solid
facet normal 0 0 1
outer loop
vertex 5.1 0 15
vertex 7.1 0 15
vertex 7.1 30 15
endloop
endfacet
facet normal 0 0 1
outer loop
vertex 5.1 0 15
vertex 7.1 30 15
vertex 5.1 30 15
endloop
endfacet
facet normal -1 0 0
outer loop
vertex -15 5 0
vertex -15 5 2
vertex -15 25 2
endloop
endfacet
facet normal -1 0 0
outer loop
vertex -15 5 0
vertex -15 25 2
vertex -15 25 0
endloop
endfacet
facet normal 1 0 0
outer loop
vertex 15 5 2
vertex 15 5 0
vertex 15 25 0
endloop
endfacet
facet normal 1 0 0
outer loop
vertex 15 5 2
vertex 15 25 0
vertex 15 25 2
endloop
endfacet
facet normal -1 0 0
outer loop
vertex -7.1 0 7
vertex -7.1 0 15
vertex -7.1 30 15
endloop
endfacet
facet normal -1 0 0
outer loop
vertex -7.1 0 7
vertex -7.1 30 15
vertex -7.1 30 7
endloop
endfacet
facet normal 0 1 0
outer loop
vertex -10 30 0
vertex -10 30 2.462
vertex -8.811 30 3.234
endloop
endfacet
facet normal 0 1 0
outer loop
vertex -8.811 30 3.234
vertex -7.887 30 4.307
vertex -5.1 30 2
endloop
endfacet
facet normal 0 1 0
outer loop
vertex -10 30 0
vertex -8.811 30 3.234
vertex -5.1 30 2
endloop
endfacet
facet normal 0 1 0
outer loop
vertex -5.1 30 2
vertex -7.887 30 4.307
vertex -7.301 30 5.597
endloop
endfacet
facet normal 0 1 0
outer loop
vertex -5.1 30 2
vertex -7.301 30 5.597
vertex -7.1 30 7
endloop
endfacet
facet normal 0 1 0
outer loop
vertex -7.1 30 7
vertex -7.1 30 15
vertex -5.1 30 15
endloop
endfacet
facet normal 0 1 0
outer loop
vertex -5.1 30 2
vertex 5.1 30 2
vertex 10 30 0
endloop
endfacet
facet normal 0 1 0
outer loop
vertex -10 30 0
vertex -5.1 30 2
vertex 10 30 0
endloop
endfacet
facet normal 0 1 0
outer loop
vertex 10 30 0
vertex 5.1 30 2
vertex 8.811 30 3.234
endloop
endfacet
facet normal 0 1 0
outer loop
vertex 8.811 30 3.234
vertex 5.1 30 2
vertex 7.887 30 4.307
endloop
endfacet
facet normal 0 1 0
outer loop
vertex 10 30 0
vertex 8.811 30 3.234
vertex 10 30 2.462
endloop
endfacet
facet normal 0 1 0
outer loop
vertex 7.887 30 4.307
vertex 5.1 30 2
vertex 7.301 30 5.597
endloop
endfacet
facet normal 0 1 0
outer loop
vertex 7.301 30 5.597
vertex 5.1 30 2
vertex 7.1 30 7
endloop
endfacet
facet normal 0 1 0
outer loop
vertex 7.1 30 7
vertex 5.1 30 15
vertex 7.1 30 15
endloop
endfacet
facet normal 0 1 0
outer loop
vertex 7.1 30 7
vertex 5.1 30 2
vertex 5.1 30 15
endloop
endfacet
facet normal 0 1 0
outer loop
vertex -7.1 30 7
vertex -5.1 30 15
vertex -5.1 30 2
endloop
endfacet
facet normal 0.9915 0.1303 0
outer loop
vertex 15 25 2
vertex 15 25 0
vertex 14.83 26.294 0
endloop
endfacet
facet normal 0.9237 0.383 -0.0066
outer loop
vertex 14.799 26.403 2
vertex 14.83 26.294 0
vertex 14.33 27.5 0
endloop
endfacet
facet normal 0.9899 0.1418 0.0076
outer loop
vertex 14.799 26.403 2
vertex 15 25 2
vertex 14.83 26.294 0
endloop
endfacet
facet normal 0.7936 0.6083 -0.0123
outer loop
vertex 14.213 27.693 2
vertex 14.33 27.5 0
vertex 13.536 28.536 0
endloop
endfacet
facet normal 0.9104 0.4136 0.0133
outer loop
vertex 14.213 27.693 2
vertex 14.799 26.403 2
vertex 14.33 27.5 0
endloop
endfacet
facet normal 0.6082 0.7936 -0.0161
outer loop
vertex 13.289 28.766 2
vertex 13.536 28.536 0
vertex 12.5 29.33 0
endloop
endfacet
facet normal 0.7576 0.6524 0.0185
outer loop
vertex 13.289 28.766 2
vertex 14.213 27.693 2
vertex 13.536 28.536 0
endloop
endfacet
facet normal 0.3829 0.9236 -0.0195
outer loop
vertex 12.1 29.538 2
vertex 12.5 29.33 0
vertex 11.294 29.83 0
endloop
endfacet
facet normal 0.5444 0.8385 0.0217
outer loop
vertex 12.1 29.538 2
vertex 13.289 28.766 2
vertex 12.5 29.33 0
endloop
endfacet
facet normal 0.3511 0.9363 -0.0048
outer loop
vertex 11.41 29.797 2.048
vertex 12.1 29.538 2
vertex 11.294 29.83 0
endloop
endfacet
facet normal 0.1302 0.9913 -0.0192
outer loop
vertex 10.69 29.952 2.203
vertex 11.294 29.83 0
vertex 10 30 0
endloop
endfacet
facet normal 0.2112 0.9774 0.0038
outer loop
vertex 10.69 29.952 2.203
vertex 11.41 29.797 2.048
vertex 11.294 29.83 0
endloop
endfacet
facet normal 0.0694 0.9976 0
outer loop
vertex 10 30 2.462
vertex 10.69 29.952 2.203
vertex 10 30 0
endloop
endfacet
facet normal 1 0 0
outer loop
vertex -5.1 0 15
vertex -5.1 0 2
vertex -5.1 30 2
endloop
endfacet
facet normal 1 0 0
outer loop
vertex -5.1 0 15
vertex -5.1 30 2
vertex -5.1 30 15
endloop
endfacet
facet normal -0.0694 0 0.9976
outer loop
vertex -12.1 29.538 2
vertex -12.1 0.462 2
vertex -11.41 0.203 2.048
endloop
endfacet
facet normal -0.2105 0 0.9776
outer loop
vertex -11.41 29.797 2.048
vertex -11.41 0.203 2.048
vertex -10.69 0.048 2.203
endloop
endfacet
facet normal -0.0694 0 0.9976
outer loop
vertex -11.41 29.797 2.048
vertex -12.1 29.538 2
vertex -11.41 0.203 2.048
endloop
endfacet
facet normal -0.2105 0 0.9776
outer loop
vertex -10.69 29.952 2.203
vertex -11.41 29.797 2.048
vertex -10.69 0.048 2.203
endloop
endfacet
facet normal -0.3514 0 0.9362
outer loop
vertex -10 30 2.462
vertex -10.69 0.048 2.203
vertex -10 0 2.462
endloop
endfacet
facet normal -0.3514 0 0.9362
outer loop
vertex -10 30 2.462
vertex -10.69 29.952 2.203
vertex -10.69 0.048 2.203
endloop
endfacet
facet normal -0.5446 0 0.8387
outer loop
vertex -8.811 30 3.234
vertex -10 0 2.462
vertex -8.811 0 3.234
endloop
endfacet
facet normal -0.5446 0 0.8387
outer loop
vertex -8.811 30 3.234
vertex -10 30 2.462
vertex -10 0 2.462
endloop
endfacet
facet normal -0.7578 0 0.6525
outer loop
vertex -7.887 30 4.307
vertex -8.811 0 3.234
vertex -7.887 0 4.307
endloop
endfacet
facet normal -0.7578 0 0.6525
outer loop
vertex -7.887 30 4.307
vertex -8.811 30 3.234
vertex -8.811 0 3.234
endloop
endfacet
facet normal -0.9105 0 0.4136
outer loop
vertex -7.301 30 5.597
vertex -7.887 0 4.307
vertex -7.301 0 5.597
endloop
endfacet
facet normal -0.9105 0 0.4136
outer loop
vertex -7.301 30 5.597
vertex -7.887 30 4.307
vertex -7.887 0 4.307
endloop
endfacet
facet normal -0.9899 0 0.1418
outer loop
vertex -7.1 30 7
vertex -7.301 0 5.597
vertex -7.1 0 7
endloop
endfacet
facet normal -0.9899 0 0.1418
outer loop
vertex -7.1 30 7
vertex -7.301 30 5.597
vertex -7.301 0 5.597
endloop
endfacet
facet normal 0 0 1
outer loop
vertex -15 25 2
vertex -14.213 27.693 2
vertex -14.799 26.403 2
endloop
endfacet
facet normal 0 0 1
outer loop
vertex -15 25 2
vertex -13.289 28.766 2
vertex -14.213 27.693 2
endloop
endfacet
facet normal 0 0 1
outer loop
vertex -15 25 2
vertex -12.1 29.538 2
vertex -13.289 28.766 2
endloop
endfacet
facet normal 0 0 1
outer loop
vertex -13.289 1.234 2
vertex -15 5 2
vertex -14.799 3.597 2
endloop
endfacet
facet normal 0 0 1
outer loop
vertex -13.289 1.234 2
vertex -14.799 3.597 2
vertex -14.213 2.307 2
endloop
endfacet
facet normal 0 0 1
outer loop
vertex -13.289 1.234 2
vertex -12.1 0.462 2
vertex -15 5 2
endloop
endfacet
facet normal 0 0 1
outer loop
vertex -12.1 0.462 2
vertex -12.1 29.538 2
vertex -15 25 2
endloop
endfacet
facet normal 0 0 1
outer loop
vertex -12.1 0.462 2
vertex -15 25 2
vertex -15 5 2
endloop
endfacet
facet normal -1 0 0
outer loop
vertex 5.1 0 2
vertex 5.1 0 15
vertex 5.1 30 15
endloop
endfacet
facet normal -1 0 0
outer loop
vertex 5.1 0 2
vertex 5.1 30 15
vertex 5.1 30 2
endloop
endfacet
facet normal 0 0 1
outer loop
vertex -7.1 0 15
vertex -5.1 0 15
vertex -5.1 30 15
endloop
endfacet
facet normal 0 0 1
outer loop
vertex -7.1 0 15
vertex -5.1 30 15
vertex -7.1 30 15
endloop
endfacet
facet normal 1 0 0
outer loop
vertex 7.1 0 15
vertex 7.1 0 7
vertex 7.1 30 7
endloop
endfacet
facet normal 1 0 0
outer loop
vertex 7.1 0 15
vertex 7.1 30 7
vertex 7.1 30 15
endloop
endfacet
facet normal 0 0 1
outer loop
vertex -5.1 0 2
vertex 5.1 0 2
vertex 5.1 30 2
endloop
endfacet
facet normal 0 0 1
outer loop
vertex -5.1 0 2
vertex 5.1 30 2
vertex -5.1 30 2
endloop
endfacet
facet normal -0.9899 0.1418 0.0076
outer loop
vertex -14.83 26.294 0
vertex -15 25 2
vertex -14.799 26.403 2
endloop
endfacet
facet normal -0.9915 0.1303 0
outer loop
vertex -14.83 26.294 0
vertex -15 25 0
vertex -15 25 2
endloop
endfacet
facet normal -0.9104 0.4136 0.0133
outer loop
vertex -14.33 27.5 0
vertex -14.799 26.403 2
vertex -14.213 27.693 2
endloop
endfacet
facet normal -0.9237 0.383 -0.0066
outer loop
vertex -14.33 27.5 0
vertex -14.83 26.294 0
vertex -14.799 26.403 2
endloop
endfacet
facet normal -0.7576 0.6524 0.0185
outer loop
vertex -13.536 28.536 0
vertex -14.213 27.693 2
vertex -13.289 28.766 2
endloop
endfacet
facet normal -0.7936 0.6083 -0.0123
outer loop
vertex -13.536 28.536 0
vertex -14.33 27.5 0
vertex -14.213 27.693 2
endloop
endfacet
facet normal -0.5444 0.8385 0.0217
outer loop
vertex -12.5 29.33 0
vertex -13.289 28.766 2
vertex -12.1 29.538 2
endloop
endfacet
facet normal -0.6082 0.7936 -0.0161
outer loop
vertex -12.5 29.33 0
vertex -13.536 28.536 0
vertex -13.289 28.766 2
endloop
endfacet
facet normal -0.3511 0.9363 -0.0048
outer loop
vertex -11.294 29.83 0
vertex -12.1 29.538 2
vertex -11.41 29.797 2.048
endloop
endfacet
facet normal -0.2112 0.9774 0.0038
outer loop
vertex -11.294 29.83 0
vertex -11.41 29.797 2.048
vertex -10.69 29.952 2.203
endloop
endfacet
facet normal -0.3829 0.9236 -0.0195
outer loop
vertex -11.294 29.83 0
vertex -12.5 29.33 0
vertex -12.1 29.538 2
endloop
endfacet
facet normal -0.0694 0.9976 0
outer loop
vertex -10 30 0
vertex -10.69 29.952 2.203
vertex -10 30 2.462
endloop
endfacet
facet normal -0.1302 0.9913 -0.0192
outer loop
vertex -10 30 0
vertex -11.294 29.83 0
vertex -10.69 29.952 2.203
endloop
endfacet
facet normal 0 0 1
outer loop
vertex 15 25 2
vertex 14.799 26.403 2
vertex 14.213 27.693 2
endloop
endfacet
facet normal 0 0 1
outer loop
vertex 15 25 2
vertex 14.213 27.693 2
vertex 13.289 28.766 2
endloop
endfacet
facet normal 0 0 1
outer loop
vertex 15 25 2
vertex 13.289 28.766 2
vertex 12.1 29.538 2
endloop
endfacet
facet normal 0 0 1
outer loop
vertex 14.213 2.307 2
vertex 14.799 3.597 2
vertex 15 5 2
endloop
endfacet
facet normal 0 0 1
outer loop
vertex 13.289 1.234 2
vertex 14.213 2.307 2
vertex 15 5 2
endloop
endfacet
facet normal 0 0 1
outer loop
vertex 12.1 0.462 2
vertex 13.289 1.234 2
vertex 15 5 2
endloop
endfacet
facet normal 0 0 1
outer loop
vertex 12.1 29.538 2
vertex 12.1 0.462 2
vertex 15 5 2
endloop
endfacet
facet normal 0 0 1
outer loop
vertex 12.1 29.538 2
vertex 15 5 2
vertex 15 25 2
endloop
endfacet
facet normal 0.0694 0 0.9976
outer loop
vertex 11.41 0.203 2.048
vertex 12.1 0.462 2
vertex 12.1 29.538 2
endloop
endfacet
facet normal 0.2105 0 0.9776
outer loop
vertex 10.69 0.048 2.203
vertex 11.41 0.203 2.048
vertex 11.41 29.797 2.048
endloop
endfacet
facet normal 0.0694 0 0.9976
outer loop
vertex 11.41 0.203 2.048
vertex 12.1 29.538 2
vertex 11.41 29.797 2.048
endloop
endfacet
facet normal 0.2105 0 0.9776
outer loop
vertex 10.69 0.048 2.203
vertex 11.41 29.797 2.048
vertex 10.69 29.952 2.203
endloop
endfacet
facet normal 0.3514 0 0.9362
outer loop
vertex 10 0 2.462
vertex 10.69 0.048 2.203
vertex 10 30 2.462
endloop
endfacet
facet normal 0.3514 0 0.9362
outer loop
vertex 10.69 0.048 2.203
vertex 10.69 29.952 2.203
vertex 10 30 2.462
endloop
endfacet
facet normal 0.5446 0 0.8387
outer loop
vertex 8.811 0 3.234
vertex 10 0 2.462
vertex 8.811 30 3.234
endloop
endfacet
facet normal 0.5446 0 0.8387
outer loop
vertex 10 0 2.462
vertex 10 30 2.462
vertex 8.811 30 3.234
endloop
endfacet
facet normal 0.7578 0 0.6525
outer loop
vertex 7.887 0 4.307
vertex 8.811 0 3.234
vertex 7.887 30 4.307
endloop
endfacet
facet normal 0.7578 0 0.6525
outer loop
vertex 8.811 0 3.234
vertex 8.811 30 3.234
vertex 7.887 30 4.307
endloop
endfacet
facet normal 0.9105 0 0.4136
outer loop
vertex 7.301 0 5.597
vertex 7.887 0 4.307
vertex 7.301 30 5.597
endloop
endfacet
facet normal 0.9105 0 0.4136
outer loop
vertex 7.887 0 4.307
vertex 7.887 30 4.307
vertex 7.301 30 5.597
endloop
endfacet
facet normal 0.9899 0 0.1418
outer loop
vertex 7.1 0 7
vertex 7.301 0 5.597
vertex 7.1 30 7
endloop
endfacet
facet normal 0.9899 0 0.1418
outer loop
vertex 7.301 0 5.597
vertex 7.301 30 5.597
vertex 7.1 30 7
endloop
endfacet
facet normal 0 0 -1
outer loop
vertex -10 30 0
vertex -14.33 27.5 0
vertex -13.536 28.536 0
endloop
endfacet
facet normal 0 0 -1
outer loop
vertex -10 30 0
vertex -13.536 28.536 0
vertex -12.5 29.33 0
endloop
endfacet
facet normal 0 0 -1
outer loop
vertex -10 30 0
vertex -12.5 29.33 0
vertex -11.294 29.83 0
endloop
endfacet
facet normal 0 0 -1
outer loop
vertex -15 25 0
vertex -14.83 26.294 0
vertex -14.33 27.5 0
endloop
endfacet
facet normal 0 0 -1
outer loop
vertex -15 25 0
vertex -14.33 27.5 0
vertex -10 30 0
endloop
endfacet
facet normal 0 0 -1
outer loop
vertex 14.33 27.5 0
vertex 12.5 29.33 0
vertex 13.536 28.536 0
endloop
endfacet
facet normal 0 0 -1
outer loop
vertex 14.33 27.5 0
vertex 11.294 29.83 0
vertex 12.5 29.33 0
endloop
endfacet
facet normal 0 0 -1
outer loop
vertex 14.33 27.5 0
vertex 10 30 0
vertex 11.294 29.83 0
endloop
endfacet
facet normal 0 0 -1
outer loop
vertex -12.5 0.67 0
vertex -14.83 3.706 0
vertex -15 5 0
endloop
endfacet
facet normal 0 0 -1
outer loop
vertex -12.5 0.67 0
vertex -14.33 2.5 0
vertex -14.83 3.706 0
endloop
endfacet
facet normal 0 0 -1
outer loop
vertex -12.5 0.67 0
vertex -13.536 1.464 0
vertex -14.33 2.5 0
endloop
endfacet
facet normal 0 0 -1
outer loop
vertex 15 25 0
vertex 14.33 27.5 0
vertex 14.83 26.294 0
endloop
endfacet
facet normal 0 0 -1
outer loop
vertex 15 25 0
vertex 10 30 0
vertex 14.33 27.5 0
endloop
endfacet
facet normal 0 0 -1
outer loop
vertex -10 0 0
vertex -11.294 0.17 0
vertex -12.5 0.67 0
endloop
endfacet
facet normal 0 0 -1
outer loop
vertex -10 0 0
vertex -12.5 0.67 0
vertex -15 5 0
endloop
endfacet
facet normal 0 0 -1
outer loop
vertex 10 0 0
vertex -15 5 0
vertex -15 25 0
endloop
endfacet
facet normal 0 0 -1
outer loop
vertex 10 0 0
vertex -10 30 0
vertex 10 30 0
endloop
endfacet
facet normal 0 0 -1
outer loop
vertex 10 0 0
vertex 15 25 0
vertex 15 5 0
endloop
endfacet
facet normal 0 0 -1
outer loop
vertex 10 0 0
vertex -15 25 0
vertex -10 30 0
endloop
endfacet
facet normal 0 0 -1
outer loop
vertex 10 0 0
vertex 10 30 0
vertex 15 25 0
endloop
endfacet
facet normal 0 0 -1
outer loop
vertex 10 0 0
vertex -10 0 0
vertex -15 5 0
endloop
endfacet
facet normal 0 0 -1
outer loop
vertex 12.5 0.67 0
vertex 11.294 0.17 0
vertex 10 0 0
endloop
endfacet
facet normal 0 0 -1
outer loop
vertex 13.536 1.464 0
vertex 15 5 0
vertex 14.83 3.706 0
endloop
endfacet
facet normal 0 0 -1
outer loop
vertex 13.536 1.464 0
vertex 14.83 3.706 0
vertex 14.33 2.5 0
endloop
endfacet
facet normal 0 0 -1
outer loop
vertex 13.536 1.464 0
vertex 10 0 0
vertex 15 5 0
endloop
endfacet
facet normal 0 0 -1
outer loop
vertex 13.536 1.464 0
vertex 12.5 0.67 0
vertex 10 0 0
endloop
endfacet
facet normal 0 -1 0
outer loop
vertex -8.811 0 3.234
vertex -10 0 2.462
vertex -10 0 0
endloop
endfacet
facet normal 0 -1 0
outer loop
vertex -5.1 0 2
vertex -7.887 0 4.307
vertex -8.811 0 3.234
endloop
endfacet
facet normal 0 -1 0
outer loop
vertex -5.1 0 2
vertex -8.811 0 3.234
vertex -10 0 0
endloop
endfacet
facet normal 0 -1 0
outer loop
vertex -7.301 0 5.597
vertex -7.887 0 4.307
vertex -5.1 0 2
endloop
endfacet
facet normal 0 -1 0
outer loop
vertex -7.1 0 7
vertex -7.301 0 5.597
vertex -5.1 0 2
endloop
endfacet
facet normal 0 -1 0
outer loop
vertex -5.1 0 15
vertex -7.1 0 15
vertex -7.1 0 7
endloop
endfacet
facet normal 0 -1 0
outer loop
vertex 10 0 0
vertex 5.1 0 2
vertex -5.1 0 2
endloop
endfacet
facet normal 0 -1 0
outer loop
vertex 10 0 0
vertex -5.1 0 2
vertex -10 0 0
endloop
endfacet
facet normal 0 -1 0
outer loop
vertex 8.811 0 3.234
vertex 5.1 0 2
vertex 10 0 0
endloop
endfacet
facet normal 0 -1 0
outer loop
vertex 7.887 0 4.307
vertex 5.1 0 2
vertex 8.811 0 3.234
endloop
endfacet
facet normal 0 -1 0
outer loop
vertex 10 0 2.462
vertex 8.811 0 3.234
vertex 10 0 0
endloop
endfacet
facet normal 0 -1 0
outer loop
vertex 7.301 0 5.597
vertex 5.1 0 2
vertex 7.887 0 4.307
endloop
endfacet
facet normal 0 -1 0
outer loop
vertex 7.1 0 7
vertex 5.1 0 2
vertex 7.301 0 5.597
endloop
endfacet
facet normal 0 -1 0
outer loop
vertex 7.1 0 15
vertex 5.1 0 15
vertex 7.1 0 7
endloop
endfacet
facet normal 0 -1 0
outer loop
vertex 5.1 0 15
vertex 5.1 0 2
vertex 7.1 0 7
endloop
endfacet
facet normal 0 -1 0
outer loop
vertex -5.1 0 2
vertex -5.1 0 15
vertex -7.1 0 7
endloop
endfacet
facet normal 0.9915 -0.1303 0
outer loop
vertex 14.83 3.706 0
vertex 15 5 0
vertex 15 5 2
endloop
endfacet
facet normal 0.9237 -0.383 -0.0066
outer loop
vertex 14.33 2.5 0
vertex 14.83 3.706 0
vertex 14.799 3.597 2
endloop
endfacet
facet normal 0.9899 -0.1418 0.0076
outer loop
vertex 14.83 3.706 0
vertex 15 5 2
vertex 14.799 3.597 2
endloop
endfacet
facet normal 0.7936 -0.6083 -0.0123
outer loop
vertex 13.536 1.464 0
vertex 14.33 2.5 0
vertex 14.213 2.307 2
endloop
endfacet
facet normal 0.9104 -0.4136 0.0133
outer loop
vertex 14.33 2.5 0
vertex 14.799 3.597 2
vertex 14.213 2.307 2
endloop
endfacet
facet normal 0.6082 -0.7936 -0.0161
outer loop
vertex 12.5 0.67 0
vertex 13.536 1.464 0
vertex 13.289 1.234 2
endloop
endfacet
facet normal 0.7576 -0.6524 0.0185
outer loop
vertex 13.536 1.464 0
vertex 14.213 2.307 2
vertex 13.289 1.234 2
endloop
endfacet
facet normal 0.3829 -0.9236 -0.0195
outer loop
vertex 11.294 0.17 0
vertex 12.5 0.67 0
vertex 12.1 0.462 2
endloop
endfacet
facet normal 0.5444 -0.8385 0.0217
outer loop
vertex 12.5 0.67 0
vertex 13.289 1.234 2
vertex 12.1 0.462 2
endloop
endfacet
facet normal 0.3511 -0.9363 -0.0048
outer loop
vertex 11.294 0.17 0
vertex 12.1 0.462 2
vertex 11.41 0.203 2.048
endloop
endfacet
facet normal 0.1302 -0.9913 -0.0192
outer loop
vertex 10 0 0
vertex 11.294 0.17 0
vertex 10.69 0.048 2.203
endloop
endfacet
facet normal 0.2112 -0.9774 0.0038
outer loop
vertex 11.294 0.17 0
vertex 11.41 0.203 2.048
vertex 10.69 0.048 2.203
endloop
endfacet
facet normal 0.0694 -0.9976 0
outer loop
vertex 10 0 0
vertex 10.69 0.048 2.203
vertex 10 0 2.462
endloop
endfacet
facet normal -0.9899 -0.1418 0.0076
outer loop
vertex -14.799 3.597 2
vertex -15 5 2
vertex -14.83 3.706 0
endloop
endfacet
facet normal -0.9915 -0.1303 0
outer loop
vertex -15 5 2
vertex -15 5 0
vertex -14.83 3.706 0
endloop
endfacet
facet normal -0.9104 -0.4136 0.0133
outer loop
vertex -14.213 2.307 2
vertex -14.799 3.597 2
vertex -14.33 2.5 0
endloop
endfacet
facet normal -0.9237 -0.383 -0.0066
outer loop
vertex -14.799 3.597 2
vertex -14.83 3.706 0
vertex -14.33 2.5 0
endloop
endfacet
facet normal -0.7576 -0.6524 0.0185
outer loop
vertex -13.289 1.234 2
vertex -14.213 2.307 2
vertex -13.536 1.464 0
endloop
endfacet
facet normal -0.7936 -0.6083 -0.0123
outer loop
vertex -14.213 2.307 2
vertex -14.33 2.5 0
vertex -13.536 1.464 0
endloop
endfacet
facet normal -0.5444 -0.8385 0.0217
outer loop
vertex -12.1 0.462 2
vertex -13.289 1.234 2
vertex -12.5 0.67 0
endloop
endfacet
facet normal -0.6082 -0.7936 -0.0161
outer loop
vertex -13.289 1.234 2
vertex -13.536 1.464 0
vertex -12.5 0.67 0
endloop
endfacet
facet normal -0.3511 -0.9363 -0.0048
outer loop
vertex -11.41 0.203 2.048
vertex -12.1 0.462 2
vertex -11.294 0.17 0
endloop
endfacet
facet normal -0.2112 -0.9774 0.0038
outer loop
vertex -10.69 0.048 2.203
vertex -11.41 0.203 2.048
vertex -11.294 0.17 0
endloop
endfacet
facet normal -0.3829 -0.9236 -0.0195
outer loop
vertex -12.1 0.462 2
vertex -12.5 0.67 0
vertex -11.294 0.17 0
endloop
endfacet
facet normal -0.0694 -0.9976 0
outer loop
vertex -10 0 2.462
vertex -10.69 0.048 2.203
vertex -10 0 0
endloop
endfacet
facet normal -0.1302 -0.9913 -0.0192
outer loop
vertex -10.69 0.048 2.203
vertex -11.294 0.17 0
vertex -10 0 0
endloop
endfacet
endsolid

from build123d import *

# Parameters (mm, degrees)
F1_DEPTH = 30
F2_R     = 5
F3_R     = 5


with BuildPart() as f1:
    # F0 (on Front) → F1 (new body)
    with BuildSketch(Plane.XZ):
        Polygon((-15, 2), (-15, 0), (15, 0), (15, 2), (7.1, 2), (7.1, 15), (5.1, 15), (5.1, 2), (-5.1, 2), (-5.1, 15), (-7.1, 15), (-7.1, 2), align=None)
    extrude(amount=-F1_DEPTH)

    # F2
    f2_edges = [f1.edges().sort_by_distance(p)[0] for p in [
        (-15, 0, 1),
        (15, 0, 1),
        (-15, 30, 1),
        (15, 30, 1),
    ]]
    fillet(f2_edges, radius=F2_R)

    # F3
    f3_edges = [f1.edges().sort_by_distance(p)[0] for p in [
        (-7.1, 15, 2),
        (7.1, 15, 2),
    ]]
    fillet(f3_edges, radius=F3_R)


solid = f1.part
